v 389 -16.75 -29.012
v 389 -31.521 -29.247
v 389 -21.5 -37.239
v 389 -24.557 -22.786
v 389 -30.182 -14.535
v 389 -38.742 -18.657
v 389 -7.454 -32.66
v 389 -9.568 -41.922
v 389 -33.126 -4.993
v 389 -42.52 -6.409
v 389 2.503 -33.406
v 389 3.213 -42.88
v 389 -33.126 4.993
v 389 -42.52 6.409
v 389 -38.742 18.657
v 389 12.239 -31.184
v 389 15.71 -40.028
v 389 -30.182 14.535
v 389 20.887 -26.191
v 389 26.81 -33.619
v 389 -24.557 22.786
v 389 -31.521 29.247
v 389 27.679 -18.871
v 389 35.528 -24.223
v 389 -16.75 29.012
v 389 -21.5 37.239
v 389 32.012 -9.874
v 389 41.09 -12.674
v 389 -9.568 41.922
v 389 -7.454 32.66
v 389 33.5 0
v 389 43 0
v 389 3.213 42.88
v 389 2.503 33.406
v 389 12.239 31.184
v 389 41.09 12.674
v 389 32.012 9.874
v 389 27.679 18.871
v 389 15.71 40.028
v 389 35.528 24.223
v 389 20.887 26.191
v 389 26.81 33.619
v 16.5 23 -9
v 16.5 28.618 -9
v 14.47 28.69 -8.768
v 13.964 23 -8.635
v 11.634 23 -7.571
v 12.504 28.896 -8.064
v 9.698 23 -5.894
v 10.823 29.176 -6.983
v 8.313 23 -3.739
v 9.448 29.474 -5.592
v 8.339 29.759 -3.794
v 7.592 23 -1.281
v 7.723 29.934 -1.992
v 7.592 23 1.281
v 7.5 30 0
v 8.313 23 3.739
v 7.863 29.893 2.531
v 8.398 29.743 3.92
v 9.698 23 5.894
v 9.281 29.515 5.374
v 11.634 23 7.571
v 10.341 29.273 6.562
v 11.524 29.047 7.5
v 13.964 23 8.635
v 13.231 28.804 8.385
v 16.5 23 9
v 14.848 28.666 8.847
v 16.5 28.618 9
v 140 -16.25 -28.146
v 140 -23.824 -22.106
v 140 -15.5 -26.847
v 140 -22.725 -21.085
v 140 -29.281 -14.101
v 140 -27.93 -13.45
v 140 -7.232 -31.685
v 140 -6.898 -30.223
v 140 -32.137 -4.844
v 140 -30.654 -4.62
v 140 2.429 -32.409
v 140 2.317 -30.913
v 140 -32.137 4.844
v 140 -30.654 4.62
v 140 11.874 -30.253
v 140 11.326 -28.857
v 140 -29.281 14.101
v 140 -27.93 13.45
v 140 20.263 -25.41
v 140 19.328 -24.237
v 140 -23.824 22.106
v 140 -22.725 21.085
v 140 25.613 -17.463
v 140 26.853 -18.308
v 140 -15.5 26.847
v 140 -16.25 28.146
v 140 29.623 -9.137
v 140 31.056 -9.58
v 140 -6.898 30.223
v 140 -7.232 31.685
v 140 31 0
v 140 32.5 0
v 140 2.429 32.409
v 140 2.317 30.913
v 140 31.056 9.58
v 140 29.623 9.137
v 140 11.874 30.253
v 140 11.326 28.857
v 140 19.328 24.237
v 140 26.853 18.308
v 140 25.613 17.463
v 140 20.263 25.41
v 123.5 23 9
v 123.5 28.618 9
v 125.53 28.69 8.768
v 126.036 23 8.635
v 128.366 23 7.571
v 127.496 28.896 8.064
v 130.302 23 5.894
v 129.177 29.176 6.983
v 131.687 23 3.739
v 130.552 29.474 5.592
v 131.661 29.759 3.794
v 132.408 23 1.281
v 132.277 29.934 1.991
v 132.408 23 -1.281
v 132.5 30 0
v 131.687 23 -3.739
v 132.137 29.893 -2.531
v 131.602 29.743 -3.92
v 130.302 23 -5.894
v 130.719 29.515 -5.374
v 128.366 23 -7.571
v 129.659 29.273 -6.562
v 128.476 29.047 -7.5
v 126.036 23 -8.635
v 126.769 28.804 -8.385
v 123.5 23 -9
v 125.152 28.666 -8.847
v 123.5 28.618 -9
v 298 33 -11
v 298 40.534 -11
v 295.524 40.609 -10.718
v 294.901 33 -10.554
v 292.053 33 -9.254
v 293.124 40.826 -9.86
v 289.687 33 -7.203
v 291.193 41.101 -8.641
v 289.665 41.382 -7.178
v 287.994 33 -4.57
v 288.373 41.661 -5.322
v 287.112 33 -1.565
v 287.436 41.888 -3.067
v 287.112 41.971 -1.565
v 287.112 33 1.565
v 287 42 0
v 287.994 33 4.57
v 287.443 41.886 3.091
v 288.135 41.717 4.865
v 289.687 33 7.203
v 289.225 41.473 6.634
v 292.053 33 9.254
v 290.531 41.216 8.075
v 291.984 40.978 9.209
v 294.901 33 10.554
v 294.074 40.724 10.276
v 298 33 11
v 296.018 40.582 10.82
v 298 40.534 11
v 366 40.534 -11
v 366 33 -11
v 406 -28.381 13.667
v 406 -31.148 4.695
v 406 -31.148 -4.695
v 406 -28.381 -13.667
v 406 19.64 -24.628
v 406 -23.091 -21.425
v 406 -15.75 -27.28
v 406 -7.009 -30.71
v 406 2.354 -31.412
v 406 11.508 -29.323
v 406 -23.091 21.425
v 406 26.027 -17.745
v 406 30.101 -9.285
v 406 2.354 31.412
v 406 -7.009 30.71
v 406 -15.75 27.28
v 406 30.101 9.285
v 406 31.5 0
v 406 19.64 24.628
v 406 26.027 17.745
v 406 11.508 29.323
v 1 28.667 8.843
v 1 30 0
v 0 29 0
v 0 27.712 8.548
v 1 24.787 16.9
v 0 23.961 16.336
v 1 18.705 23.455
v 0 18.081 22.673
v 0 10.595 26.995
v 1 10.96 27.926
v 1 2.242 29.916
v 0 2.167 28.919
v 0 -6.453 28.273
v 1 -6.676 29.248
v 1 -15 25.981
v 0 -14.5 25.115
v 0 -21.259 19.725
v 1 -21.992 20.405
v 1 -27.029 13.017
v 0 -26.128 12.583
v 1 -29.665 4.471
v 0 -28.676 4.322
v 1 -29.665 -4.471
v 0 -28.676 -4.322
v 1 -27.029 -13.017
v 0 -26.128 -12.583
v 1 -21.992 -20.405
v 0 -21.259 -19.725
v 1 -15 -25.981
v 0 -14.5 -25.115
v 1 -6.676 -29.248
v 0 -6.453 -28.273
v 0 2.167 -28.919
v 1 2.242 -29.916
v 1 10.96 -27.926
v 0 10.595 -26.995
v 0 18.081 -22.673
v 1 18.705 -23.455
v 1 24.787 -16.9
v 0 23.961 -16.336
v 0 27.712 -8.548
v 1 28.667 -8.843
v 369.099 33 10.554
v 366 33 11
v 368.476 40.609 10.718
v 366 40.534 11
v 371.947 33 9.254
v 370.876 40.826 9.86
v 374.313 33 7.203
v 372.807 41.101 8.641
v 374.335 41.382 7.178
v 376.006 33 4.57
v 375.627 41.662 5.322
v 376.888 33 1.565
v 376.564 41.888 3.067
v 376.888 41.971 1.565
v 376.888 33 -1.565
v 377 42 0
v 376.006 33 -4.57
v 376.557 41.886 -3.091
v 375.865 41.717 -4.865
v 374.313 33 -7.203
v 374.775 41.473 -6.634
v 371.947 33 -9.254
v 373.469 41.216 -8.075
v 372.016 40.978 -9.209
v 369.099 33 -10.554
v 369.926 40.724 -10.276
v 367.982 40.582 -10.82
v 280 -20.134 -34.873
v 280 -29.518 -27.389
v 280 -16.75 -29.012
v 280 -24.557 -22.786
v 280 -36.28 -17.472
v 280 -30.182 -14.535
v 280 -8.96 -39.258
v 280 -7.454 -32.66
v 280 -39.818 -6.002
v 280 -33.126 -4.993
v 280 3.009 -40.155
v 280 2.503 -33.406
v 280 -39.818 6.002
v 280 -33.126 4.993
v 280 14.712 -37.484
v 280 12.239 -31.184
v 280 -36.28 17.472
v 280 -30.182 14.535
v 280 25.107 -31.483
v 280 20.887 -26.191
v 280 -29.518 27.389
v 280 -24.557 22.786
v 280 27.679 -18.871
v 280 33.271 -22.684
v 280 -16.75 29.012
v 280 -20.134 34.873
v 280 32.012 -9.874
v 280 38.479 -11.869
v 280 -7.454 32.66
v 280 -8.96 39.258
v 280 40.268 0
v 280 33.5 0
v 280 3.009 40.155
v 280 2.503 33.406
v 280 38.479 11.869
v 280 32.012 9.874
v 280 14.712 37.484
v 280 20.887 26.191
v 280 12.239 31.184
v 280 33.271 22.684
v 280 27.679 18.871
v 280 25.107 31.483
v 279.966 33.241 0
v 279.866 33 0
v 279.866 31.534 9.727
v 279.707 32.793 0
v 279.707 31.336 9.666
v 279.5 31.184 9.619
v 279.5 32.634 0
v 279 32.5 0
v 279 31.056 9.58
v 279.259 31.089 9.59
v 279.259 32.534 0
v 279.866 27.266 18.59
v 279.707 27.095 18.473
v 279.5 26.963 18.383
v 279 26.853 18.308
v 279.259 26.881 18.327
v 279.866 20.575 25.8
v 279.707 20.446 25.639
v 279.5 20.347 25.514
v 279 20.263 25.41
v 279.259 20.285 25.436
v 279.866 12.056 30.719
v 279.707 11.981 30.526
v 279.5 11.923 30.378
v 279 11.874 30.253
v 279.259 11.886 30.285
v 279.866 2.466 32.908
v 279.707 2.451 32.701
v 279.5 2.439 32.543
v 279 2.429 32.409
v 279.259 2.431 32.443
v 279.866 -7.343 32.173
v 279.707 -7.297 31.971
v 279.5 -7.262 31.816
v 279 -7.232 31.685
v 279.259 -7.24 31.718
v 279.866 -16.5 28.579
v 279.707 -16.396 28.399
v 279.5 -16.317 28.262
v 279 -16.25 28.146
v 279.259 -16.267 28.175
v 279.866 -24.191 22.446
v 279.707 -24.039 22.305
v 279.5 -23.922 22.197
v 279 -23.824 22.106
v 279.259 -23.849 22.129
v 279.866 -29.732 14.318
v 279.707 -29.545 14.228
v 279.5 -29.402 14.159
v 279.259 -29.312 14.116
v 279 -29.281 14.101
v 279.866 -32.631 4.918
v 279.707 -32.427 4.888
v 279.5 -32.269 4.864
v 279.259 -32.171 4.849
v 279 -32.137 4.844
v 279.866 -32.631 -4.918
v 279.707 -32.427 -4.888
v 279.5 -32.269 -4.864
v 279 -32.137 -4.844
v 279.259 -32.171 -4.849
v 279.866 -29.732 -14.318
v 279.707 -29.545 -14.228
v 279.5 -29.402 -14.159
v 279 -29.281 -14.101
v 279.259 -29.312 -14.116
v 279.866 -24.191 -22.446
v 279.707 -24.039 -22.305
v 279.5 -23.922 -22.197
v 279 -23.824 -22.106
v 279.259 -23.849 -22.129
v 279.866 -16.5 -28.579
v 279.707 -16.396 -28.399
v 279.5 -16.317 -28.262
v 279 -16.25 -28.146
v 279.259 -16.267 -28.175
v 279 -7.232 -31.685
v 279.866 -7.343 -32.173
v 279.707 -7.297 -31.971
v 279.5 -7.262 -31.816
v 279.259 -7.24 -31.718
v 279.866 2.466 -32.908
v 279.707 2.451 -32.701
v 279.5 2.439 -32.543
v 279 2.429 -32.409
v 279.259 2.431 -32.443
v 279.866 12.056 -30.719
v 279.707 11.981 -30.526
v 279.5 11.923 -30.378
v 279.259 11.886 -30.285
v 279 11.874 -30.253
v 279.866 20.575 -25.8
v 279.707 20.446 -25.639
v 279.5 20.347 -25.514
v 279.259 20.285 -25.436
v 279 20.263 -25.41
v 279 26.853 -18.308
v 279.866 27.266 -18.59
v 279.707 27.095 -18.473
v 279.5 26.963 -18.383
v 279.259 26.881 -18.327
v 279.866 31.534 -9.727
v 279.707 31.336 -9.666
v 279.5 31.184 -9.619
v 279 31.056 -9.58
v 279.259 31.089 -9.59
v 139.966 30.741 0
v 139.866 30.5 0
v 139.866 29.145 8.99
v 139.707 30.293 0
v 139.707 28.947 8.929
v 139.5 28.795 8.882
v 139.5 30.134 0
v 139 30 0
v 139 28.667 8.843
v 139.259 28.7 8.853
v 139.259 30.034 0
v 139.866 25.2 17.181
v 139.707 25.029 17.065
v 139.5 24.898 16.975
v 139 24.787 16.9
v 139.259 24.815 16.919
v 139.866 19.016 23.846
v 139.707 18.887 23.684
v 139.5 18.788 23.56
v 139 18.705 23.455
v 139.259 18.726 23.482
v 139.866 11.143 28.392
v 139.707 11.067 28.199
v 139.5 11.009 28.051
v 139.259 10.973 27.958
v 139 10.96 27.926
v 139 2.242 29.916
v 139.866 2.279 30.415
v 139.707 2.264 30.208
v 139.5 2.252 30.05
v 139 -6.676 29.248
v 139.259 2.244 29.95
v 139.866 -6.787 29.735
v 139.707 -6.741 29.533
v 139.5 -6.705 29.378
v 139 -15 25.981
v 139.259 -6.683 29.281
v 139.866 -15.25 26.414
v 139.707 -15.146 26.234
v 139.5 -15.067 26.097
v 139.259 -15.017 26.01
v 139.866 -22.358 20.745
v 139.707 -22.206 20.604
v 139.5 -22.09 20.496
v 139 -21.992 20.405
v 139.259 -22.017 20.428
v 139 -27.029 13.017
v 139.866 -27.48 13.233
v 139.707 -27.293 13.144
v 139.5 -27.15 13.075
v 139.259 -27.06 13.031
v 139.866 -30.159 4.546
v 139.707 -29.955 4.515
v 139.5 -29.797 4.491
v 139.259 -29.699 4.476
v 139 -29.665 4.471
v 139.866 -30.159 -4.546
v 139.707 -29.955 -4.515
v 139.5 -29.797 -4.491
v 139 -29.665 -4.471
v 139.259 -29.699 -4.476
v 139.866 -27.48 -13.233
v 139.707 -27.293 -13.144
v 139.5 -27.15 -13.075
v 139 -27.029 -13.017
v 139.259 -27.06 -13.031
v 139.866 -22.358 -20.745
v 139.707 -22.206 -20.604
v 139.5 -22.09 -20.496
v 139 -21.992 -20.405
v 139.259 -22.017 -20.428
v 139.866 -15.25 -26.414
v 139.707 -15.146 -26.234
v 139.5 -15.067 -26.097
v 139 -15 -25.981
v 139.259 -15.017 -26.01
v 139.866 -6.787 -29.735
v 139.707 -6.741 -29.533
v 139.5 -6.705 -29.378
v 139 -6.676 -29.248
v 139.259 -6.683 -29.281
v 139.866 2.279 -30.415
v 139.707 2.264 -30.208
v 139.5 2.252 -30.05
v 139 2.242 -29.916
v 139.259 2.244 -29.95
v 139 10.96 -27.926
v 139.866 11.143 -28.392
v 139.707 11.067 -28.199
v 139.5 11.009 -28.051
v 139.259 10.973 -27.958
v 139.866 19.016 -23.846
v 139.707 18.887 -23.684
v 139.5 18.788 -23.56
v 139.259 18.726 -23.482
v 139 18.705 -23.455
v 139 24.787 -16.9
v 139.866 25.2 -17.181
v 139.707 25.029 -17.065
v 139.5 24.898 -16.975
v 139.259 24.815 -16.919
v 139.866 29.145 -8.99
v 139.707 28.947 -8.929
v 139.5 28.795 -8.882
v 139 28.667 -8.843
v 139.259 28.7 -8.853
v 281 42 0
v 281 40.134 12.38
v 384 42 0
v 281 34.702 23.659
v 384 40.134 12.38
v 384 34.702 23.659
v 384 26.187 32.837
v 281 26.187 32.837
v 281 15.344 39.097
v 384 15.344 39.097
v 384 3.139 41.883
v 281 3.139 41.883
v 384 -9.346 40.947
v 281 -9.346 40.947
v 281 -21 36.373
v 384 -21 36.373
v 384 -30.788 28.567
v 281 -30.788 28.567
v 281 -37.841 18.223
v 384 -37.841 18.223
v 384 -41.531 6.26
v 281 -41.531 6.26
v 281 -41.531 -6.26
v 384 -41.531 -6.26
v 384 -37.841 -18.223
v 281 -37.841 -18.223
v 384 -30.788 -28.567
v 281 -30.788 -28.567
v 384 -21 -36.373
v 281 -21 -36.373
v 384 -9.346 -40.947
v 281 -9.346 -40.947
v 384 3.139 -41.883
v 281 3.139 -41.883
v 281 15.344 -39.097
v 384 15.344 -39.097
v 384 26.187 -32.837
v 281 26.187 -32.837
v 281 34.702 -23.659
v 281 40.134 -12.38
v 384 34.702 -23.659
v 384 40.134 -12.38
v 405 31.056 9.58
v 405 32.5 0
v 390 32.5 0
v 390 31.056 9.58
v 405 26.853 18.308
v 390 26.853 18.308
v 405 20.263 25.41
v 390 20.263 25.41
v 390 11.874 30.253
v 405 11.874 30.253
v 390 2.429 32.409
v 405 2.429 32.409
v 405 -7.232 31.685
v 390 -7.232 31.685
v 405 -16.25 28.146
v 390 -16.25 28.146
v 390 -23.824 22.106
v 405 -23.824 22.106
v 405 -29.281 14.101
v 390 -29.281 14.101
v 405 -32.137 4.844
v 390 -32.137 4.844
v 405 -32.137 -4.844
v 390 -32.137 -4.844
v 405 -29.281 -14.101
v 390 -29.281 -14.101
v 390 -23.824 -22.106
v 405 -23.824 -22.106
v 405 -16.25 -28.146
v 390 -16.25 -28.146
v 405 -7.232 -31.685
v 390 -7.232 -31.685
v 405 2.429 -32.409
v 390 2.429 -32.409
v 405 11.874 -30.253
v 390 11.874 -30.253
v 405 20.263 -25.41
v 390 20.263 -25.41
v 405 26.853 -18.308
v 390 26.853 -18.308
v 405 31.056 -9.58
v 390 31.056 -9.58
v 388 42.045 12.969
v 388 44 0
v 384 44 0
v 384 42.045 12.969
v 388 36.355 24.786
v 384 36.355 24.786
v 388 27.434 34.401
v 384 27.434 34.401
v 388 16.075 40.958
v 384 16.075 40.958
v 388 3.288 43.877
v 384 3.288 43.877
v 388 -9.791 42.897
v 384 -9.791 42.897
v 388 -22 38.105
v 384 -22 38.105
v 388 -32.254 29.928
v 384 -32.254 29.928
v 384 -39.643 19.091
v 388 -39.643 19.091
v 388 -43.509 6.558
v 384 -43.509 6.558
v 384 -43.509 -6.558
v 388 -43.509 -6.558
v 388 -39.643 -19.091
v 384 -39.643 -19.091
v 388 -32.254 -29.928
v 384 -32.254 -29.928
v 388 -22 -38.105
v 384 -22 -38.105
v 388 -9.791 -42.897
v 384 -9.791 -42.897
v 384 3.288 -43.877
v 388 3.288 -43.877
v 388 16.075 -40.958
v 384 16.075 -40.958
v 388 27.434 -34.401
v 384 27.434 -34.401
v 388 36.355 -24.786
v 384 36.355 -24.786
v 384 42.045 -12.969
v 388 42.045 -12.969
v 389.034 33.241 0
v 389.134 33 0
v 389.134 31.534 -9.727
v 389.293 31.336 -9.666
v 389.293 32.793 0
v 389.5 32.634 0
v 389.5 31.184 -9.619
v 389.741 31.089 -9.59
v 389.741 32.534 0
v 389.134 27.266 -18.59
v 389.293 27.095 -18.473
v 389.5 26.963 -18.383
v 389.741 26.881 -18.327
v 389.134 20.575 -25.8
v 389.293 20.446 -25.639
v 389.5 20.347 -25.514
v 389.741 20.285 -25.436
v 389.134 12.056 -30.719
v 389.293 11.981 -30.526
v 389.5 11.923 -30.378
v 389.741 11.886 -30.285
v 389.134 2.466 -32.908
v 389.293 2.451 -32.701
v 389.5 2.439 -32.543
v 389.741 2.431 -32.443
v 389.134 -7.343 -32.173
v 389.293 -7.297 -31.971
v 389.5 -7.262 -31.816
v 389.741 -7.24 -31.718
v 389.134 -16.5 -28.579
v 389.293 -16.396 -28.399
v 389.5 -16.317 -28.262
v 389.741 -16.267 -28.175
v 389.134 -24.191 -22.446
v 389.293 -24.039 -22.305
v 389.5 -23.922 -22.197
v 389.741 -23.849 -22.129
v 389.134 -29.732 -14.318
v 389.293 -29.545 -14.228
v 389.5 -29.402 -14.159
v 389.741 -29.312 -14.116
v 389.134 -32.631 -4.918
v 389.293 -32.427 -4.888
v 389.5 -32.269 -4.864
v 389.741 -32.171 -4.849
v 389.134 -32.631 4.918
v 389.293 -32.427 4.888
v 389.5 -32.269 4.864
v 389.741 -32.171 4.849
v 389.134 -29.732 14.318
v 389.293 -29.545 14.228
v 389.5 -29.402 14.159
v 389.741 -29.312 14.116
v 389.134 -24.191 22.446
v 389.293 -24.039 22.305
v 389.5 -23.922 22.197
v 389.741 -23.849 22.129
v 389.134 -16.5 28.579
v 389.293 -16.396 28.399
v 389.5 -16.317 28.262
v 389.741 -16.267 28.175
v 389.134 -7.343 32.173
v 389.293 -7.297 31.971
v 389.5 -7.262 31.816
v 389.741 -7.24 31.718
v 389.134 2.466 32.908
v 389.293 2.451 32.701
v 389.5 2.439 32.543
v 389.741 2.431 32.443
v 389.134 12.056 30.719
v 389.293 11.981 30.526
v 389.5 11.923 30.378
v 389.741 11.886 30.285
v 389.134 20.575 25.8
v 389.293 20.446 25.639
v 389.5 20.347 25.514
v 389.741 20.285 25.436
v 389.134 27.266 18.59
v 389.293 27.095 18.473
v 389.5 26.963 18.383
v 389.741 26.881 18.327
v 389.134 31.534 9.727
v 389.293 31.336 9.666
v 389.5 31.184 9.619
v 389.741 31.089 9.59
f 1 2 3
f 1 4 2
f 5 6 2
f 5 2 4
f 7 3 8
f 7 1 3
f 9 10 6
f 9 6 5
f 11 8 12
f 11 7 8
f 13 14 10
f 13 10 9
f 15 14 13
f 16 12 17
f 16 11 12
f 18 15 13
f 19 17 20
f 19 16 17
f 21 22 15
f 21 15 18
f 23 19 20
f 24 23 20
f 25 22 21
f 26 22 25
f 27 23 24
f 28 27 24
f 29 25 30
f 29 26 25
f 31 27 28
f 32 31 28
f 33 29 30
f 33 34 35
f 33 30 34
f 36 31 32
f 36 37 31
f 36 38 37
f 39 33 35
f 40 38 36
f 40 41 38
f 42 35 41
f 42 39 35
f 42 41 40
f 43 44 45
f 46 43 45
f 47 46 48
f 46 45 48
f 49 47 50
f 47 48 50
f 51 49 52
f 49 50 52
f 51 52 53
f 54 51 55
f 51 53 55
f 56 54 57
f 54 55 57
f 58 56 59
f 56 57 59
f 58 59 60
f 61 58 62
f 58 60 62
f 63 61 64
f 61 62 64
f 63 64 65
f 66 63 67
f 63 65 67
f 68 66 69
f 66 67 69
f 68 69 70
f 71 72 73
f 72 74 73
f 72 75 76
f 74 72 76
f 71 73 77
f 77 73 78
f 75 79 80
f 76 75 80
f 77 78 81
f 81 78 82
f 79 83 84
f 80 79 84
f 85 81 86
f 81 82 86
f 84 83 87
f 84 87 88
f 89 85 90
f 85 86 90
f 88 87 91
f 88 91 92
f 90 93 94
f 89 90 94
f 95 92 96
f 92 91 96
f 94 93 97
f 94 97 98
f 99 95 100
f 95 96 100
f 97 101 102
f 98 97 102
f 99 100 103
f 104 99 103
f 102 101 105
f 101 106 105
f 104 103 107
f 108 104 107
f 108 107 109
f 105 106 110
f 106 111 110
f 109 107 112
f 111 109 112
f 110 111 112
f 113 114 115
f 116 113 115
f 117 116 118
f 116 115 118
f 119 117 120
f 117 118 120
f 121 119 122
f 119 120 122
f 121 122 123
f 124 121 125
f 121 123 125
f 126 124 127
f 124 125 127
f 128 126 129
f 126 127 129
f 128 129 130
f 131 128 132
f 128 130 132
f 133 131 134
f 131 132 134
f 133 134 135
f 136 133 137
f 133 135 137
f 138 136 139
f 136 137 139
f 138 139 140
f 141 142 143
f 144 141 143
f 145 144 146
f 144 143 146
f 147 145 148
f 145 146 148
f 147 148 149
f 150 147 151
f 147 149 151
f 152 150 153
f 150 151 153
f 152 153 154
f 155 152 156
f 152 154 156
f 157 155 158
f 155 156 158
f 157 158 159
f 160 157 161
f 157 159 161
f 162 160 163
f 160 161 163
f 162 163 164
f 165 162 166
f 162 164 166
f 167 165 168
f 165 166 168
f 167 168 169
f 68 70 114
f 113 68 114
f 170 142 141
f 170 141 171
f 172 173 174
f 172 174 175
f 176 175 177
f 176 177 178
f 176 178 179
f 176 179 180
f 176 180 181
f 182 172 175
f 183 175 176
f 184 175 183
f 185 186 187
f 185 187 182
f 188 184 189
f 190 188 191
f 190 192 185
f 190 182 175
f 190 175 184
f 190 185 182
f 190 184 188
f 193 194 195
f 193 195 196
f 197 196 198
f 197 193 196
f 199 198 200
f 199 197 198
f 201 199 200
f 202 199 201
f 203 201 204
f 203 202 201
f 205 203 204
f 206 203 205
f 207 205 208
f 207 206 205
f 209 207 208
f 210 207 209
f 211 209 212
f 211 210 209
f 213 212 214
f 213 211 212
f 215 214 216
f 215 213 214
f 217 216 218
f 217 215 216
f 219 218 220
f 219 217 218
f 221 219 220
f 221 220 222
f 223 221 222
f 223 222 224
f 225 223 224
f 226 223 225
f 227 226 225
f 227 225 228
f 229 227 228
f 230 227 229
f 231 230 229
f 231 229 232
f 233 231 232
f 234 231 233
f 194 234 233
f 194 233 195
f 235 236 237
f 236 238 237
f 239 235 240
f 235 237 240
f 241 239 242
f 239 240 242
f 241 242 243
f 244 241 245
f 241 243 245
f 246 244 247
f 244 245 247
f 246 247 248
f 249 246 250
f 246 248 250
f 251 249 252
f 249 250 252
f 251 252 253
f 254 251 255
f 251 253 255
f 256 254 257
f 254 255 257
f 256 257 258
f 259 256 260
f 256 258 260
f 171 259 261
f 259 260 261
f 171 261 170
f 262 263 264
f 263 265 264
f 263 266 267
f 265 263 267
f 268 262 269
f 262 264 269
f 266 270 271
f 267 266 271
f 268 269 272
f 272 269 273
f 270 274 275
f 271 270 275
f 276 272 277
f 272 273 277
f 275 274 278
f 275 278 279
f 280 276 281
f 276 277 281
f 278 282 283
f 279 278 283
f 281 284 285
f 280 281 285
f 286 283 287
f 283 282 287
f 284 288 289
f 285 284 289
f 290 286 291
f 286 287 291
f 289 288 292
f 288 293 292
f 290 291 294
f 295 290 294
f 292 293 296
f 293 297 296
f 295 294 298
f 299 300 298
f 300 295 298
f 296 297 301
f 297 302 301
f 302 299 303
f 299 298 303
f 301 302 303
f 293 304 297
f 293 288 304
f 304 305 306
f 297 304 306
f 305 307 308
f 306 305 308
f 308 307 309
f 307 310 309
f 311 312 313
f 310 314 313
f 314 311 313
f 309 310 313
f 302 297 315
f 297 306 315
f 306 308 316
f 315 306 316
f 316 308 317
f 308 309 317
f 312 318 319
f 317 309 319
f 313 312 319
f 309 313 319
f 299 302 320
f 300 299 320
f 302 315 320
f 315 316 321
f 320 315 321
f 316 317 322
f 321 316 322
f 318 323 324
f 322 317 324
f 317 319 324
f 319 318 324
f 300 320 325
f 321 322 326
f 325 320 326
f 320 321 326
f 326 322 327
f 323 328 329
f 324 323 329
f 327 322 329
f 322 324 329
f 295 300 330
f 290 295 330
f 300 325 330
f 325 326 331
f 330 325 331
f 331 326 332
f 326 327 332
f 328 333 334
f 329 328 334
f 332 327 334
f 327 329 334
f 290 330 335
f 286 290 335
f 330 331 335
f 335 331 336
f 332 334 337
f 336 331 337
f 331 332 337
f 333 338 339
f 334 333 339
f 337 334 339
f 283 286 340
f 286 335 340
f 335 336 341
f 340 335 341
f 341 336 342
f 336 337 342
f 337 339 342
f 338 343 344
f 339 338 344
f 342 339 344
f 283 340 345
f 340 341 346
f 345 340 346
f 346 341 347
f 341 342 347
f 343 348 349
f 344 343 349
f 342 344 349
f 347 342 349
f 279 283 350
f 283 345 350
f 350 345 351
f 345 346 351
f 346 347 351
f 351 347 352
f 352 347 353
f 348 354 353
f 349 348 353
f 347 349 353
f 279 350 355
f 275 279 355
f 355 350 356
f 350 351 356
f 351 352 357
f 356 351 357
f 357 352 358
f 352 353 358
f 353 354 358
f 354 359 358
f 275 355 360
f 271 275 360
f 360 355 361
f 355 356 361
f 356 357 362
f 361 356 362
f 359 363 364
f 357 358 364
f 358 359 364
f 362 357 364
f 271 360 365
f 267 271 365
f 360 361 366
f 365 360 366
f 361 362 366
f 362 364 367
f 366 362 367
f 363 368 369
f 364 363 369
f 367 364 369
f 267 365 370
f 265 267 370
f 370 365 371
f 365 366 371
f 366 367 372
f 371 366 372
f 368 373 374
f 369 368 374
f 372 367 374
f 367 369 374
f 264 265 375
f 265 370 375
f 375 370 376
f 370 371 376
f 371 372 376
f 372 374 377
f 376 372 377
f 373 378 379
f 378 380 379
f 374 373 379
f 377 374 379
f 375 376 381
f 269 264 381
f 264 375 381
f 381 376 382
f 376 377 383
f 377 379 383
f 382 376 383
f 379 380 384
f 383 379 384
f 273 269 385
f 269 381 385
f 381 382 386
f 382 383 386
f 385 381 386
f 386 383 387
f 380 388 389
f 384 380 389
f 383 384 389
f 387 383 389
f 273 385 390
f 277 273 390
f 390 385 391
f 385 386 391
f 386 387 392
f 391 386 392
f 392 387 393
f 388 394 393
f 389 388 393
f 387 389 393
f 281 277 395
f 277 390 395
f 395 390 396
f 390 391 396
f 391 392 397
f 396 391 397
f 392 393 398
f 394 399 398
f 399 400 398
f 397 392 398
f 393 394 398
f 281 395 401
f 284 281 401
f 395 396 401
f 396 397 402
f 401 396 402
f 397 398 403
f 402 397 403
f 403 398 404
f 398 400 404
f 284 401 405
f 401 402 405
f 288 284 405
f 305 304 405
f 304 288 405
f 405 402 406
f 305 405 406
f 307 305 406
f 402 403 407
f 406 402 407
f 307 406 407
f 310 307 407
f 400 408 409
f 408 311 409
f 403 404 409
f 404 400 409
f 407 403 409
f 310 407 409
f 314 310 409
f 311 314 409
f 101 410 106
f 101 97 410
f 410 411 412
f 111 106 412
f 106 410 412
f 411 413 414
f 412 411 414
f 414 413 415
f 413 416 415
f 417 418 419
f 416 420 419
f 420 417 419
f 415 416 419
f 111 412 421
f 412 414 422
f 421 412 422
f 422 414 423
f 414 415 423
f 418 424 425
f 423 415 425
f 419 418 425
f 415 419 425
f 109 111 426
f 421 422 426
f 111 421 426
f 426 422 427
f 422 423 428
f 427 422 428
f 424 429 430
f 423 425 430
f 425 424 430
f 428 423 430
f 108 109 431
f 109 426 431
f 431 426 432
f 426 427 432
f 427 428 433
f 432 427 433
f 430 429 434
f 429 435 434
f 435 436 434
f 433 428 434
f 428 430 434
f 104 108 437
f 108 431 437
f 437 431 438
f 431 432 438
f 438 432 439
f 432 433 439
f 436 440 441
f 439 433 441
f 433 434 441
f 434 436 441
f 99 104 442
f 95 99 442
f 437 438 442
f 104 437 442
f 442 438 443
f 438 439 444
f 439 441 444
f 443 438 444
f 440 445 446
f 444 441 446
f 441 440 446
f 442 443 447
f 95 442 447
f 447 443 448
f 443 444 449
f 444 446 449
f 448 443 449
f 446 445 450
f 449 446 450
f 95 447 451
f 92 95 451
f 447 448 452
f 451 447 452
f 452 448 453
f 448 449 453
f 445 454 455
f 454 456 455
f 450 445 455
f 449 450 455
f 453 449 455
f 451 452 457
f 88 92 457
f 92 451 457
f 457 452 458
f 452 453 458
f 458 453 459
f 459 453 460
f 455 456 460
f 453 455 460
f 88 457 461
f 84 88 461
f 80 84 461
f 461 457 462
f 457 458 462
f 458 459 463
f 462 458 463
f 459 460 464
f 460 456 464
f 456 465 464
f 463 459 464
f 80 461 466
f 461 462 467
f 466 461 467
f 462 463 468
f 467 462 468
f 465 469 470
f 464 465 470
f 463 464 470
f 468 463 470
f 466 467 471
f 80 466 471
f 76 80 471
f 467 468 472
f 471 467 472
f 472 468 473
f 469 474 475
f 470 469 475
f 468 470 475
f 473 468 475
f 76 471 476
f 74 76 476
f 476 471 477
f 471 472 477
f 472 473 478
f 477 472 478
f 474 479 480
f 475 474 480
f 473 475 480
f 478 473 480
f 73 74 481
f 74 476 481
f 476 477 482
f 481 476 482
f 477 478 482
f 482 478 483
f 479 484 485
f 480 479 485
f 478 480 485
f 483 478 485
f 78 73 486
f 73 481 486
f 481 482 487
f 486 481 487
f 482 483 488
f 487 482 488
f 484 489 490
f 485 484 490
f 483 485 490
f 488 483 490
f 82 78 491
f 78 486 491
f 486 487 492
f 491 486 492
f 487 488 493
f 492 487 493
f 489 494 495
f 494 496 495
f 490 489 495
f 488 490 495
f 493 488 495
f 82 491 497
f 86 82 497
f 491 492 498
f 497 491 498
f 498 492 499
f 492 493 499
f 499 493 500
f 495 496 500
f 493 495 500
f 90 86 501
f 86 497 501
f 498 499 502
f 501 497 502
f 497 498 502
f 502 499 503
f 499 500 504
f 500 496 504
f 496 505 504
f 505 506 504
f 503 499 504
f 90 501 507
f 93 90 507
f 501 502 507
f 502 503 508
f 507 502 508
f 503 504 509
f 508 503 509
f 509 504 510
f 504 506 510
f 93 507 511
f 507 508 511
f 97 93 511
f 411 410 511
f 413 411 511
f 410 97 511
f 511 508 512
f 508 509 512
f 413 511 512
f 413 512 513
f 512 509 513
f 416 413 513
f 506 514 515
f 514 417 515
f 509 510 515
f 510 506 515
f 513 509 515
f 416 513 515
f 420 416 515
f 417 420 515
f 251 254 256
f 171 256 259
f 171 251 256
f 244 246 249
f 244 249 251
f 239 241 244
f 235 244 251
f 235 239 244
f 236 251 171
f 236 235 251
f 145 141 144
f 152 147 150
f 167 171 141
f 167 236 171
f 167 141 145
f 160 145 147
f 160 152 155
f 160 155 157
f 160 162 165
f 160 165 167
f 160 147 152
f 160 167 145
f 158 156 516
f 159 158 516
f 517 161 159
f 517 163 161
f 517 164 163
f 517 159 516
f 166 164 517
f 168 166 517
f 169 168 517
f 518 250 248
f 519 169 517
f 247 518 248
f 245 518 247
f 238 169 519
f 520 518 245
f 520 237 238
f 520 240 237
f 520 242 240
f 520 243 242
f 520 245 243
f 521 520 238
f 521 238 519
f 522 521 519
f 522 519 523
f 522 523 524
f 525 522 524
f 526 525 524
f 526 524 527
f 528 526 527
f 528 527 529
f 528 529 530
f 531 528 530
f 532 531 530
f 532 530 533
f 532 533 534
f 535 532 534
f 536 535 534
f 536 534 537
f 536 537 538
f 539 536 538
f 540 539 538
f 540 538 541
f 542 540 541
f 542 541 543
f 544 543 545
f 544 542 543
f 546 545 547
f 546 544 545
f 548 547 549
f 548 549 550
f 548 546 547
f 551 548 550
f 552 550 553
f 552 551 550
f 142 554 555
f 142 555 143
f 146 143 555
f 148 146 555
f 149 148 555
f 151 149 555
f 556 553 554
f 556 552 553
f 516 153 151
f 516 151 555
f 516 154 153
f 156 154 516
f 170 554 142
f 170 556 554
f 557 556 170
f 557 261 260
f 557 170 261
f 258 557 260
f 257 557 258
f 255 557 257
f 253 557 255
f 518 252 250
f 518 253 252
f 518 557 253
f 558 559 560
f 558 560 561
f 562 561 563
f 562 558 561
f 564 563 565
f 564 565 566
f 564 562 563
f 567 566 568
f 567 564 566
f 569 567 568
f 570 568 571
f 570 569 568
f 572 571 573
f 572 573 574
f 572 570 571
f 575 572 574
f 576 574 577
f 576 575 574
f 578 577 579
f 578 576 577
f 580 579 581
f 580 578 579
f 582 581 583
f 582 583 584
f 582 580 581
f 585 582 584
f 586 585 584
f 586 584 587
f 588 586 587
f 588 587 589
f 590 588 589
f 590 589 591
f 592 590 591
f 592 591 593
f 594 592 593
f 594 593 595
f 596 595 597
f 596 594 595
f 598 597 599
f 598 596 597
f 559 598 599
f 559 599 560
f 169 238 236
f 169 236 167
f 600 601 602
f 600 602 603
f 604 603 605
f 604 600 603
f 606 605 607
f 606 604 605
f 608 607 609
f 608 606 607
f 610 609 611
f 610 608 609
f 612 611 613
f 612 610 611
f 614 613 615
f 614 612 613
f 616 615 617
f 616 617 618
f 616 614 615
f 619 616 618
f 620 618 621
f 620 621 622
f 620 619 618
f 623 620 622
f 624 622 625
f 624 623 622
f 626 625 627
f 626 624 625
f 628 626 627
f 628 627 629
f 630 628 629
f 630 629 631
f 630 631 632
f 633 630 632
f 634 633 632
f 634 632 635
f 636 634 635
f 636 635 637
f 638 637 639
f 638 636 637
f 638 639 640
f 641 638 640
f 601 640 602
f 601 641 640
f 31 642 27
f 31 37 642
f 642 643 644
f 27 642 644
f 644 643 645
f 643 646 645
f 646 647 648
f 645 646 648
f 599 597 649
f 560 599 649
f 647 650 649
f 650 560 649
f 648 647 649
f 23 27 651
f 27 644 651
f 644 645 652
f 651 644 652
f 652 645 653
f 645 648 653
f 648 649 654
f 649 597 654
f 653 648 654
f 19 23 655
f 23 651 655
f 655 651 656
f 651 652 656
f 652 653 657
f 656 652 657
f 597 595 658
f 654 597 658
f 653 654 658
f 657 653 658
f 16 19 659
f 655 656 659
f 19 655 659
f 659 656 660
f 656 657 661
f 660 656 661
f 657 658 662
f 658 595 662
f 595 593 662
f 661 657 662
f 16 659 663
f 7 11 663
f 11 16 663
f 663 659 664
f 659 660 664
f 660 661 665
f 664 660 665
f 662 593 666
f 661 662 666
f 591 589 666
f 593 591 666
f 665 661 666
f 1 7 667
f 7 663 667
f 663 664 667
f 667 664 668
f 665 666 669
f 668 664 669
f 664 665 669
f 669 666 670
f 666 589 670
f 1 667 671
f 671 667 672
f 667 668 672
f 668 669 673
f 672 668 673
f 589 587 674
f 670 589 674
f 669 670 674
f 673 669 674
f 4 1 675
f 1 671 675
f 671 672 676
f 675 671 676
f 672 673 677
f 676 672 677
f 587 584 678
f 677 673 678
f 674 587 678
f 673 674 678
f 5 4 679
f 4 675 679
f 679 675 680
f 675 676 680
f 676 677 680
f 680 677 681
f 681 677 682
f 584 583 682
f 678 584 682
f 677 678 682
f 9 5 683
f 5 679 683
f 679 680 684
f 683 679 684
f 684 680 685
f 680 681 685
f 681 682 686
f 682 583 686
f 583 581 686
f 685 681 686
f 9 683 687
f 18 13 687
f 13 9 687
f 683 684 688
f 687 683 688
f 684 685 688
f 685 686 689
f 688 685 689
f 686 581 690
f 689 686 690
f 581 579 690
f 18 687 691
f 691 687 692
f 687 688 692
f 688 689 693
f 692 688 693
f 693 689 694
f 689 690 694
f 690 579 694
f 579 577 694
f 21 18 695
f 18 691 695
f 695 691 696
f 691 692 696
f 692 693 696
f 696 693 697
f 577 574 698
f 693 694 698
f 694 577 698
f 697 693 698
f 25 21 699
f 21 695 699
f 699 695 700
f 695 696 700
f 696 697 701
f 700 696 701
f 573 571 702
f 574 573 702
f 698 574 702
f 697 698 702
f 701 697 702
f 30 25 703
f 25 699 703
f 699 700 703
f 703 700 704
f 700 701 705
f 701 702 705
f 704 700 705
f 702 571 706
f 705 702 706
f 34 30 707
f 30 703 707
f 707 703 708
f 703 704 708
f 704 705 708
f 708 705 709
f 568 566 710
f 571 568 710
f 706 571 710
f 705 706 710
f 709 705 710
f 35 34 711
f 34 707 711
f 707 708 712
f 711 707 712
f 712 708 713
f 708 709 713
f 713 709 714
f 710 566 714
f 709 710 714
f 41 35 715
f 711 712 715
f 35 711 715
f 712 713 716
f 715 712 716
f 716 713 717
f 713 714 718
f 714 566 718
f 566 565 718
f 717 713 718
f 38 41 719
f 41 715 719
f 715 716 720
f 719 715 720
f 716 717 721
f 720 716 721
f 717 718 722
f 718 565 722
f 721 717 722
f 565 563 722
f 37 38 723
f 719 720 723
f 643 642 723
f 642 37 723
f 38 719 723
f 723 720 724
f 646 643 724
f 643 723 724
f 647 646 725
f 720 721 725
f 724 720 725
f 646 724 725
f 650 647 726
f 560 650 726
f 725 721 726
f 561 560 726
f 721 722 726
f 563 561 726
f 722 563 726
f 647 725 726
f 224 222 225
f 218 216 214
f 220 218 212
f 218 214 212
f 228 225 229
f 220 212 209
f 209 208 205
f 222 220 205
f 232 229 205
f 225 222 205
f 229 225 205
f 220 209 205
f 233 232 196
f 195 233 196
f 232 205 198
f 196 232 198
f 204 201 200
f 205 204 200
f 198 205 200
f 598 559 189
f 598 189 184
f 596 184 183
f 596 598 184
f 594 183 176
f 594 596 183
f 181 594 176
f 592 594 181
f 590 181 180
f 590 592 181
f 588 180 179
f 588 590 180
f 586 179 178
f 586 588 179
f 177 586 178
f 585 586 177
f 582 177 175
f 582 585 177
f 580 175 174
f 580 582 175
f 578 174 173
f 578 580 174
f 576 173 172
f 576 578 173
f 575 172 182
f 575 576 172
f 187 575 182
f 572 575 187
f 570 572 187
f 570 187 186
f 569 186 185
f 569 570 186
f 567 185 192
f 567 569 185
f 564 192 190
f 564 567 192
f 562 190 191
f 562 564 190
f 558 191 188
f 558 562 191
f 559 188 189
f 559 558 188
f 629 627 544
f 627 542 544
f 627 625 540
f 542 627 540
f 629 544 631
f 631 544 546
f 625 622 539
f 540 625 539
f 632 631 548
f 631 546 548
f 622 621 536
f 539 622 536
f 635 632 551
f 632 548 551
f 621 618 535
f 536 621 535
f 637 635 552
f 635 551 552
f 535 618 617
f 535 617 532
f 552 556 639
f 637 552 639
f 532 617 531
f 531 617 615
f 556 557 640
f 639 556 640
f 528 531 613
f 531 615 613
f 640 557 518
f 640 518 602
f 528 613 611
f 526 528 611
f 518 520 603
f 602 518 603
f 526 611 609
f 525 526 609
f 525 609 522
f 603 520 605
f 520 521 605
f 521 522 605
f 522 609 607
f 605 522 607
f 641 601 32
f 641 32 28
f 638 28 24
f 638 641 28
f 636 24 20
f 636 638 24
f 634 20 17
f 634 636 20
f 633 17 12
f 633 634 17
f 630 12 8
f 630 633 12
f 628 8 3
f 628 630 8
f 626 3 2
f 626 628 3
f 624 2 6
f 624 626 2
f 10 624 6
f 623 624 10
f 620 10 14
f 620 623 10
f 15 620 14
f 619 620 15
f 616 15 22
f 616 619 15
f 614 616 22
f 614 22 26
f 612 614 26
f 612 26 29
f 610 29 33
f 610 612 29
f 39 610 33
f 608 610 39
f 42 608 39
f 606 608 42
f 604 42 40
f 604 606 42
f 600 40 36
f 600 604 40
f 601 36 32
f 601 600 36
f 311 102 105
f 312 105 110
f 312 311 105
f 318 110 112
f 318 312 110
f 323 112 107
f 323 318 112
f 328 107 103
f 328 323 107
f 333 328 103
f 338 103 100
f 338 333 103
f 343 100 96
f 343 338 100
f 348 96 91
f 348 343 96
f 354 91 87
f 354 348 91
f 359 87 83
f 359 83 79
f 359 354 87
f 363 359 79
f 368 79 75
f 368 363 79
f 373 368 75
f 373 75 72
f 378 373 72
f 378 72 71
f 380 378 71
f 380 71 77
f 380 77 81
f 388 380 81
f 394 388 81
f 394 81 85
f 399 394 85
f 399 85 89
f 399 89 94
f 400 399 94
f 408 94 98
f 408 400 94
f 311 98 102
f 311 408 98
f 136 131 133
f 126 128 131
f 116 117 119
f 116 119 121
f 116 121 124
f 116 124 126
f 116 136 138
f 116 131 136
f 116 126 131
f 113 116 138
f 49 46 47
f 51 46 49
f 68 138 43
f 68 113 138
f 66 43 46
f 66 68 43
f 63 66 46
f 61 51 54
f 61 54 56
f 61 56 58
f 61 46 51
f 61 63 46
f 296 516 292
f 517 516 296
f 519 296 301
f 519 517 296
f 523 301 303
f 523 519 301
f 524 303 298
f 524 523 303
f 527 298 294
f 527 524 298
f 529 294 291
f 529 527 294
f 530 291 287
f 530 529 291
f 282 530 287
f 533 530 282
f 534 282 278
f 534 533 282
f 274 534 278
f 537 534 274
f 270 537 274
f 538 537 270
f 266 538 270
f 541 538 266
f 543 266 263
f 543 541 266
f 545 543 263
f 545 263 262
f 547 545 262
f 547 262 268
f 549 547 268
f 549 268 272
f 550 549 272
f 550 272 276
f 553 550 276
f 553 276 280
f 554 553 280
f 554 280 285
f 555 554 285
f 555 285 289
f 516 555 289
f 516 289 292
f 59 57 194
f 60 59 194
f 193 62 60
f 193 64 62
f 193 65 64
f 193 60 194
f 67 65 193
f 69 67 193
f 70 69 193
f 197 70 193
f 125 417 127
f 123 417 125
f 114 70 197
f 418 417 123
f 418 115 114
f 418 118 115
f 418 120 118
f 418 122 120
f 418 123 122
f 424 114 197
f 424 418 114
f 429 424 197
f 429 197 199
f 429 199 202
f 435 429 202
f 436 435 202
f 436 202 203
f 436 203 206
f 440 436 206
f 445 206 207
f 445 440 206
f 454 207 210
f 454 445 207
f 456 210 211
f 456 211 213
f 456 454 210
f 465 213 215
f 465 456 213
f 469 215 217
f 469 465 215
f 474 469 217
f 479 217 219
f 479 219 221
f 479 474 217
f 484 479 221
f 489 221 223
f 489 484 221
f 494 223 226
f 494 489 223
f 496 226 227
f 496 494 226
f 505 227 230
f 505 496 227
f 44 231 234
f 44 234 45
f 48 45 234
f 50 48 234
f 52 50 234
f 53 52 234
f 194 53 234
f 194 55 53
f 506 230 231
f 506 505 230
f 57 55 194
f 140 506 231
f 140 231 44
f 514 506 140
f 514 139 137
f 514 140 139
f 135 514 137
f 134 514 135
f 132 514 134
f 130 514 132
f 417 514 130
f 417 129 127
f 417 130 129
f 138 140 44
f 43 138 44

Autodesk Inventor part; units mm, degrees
ref_plane "YZ Plane" through (0, 0, 0) normal (1, 0, 0) x (0, 1, 0)
sketch "Sketch1" plane through (0, 0, 0) normal (0, 0, 1) x (1, 0, 0)
  point P0 (0, 0)
sketch "Sketch2" plane through (0, 0, 0) normal (0, 0, 1) x (1, 0, 0)
  line L0 (0, 0) -> (0, 29)
  line L1 (1, 30) -> (140, 30)
  line L2 (140, 30) -> (140, 32.5)
  line L3 (140, 32.5) -> (175, 32.5)
  line L4 (280, 37.5) -> (280, 42)
  line L5 (280, 42) -> (384, 42)
  line L6 (384, 42) -> (384, 44)
  line L7 (384, 44) -> (389, 44)
  line L8 (389, 44) -> (389, 39.5)
  line L9 (300, 32.5) -> (405, 32.5)
  line L10 (406, 31.5) -> (406, 0)
  line L11 (406, 0) -> (0, 0)
  line L12 (0, 29) -> (1, 30)
  line L13 (405, 32.5) -> (406, 31.5)
  line L14 (-81.2, 0) -> (487.2, 0) projected
  line L15 (389, 39.5) -> (389, 32.5)
  line L16 (389, 32.5) -> (300, 32.5)
  line L17 (280, 37.5) -> (280, 32.5)
  line L18 (280, 32.5) -> (175, 32.5)
  point P0 (0, 30)
  point P1 (406, 32.5)
  dimension "d0" = 30
  dimension "d1" = 140
  dimension "d2" = 32.5
  dimension "d3" = 140
  dimension "d4" = 104
  dimension "d5" = 5
  dimension "d6" = 17
  dimension "d7" = 32.5
  dimension "d8" = 42
  dimension "d9" = 2
  dimension "d10" = 1
  dimension "d11" = 45
  dimension "d12" = 1
  dimension "d13" = 45
revolve "Revolution1" add sketch "Sketch2" angle 360 about axis through (-10, 0, 0) along (1, 0, 0)
ref_plane "Work Plane1" through (70.5, 30, 0) normal (0, 1, 0) x (-1, 0, 0)
ref_plane "Work Plane2" through (332, 42, 0) normal (0, 1, 0) x (-1, 0, 0)
sketch "Sketch3" plane through (70.5, 30, 0) normal (0, 1, 0) x (-1, 0, 0)
  line L0 (54, 0) -> (-53, 0) construction
  line L1 (54, 9) -> (-53, 9)
  line L2 (-53, -9) -> (54, -9)
  arc A0 (54, -9) -> (54, 9) centre (54, 0) ccw
  arc A1 (-53, 9) -> (-53, -9) centre (-53, 0) ccw
  line L3 (-69.5, 32.5) -> (-69.5, -32.5) projected
  line L4 (0.5, -9) -> (0.5, 9) construction
  line L5 (70.5, 0) -> (-69.5, 0) construction
  line L6 (0.5, 0) -> (0.5, 9) construction
  line L7 (70.5, 29) -> (70.5, -29) construction
  point P0 (0.5, 0)
  dimension "d16" = 125
  dimension "d18" = 9
  dimension "d30" = 7.5
  dimension "d31" = 7.5
extrude "Extrusion1" cut sketch "Sketch3" against normal blind 7
sketch "Sketch4" plane through (332, 42, 0) normal (0, 1, 0) x (-1, 0, 0)
  line L0 (34, 0) -> (-34, 0) construction
  line L1 (34, -11) -> (-34, -11)
  line L2 (-34, 11) -> (34, 11)
  arc A0 (34, -11) -> (34, 11) centre (34, 0) ccw
  arc A1 (-34, 11) -> (-34, -11) centre (-34, 0) ccw
  line L3 (-52, 44) -> (-52, -44) projected
  line L4 (52, 42) -> (52, -42) projected
  line L5 (52, 42) -> (52, -42) construction
  line L6 (-52, 42) -> (-52, -42) construction
  line L7 (413.8, 0) -> (-155.3, 0) construction
  line L8 (-52, 0) -> (52, 0) construction
  line L9 (0, 11) -> (0, -11) construction
  line L10 (52, 42) -> (-52, 42) construction
  line L11 (0, 42) -> (0, -42) construction
  point P0 (332, 0)
  point P1 (0, 0)
  point P2 (0, 0)
  dimension "d22" = 11
  dimension "d32" = 90
extrude "Extrusion2" cut sketch "Sketch4" against normal blind 9
chamfer "Chamfer1" distance 1 angle 45 1 edges at (389, -44, 0) measured on face at (389, 1.3058, -39.927)
chamfer "Chamfer2" distance 1 angle 60 1 edges at (280, -42, 0) measured on face at (349.3333, 24.8095, 33.8893)
fillet "Fillet1" radius 1 1 edges at (280, -32.5, 0)
fillet "Fillet2" radius 1 1 edges at (140, -30, 0)
fillet "Fillet3" radius 1 1 edges at (389, -32.5, 0)
equation "\"d7\" = d2"
equation "\"d12\" = d10"
equation "\"d13\" = d11"
properties part number "GonjenoVratilo" material "Steel, Carbon"
